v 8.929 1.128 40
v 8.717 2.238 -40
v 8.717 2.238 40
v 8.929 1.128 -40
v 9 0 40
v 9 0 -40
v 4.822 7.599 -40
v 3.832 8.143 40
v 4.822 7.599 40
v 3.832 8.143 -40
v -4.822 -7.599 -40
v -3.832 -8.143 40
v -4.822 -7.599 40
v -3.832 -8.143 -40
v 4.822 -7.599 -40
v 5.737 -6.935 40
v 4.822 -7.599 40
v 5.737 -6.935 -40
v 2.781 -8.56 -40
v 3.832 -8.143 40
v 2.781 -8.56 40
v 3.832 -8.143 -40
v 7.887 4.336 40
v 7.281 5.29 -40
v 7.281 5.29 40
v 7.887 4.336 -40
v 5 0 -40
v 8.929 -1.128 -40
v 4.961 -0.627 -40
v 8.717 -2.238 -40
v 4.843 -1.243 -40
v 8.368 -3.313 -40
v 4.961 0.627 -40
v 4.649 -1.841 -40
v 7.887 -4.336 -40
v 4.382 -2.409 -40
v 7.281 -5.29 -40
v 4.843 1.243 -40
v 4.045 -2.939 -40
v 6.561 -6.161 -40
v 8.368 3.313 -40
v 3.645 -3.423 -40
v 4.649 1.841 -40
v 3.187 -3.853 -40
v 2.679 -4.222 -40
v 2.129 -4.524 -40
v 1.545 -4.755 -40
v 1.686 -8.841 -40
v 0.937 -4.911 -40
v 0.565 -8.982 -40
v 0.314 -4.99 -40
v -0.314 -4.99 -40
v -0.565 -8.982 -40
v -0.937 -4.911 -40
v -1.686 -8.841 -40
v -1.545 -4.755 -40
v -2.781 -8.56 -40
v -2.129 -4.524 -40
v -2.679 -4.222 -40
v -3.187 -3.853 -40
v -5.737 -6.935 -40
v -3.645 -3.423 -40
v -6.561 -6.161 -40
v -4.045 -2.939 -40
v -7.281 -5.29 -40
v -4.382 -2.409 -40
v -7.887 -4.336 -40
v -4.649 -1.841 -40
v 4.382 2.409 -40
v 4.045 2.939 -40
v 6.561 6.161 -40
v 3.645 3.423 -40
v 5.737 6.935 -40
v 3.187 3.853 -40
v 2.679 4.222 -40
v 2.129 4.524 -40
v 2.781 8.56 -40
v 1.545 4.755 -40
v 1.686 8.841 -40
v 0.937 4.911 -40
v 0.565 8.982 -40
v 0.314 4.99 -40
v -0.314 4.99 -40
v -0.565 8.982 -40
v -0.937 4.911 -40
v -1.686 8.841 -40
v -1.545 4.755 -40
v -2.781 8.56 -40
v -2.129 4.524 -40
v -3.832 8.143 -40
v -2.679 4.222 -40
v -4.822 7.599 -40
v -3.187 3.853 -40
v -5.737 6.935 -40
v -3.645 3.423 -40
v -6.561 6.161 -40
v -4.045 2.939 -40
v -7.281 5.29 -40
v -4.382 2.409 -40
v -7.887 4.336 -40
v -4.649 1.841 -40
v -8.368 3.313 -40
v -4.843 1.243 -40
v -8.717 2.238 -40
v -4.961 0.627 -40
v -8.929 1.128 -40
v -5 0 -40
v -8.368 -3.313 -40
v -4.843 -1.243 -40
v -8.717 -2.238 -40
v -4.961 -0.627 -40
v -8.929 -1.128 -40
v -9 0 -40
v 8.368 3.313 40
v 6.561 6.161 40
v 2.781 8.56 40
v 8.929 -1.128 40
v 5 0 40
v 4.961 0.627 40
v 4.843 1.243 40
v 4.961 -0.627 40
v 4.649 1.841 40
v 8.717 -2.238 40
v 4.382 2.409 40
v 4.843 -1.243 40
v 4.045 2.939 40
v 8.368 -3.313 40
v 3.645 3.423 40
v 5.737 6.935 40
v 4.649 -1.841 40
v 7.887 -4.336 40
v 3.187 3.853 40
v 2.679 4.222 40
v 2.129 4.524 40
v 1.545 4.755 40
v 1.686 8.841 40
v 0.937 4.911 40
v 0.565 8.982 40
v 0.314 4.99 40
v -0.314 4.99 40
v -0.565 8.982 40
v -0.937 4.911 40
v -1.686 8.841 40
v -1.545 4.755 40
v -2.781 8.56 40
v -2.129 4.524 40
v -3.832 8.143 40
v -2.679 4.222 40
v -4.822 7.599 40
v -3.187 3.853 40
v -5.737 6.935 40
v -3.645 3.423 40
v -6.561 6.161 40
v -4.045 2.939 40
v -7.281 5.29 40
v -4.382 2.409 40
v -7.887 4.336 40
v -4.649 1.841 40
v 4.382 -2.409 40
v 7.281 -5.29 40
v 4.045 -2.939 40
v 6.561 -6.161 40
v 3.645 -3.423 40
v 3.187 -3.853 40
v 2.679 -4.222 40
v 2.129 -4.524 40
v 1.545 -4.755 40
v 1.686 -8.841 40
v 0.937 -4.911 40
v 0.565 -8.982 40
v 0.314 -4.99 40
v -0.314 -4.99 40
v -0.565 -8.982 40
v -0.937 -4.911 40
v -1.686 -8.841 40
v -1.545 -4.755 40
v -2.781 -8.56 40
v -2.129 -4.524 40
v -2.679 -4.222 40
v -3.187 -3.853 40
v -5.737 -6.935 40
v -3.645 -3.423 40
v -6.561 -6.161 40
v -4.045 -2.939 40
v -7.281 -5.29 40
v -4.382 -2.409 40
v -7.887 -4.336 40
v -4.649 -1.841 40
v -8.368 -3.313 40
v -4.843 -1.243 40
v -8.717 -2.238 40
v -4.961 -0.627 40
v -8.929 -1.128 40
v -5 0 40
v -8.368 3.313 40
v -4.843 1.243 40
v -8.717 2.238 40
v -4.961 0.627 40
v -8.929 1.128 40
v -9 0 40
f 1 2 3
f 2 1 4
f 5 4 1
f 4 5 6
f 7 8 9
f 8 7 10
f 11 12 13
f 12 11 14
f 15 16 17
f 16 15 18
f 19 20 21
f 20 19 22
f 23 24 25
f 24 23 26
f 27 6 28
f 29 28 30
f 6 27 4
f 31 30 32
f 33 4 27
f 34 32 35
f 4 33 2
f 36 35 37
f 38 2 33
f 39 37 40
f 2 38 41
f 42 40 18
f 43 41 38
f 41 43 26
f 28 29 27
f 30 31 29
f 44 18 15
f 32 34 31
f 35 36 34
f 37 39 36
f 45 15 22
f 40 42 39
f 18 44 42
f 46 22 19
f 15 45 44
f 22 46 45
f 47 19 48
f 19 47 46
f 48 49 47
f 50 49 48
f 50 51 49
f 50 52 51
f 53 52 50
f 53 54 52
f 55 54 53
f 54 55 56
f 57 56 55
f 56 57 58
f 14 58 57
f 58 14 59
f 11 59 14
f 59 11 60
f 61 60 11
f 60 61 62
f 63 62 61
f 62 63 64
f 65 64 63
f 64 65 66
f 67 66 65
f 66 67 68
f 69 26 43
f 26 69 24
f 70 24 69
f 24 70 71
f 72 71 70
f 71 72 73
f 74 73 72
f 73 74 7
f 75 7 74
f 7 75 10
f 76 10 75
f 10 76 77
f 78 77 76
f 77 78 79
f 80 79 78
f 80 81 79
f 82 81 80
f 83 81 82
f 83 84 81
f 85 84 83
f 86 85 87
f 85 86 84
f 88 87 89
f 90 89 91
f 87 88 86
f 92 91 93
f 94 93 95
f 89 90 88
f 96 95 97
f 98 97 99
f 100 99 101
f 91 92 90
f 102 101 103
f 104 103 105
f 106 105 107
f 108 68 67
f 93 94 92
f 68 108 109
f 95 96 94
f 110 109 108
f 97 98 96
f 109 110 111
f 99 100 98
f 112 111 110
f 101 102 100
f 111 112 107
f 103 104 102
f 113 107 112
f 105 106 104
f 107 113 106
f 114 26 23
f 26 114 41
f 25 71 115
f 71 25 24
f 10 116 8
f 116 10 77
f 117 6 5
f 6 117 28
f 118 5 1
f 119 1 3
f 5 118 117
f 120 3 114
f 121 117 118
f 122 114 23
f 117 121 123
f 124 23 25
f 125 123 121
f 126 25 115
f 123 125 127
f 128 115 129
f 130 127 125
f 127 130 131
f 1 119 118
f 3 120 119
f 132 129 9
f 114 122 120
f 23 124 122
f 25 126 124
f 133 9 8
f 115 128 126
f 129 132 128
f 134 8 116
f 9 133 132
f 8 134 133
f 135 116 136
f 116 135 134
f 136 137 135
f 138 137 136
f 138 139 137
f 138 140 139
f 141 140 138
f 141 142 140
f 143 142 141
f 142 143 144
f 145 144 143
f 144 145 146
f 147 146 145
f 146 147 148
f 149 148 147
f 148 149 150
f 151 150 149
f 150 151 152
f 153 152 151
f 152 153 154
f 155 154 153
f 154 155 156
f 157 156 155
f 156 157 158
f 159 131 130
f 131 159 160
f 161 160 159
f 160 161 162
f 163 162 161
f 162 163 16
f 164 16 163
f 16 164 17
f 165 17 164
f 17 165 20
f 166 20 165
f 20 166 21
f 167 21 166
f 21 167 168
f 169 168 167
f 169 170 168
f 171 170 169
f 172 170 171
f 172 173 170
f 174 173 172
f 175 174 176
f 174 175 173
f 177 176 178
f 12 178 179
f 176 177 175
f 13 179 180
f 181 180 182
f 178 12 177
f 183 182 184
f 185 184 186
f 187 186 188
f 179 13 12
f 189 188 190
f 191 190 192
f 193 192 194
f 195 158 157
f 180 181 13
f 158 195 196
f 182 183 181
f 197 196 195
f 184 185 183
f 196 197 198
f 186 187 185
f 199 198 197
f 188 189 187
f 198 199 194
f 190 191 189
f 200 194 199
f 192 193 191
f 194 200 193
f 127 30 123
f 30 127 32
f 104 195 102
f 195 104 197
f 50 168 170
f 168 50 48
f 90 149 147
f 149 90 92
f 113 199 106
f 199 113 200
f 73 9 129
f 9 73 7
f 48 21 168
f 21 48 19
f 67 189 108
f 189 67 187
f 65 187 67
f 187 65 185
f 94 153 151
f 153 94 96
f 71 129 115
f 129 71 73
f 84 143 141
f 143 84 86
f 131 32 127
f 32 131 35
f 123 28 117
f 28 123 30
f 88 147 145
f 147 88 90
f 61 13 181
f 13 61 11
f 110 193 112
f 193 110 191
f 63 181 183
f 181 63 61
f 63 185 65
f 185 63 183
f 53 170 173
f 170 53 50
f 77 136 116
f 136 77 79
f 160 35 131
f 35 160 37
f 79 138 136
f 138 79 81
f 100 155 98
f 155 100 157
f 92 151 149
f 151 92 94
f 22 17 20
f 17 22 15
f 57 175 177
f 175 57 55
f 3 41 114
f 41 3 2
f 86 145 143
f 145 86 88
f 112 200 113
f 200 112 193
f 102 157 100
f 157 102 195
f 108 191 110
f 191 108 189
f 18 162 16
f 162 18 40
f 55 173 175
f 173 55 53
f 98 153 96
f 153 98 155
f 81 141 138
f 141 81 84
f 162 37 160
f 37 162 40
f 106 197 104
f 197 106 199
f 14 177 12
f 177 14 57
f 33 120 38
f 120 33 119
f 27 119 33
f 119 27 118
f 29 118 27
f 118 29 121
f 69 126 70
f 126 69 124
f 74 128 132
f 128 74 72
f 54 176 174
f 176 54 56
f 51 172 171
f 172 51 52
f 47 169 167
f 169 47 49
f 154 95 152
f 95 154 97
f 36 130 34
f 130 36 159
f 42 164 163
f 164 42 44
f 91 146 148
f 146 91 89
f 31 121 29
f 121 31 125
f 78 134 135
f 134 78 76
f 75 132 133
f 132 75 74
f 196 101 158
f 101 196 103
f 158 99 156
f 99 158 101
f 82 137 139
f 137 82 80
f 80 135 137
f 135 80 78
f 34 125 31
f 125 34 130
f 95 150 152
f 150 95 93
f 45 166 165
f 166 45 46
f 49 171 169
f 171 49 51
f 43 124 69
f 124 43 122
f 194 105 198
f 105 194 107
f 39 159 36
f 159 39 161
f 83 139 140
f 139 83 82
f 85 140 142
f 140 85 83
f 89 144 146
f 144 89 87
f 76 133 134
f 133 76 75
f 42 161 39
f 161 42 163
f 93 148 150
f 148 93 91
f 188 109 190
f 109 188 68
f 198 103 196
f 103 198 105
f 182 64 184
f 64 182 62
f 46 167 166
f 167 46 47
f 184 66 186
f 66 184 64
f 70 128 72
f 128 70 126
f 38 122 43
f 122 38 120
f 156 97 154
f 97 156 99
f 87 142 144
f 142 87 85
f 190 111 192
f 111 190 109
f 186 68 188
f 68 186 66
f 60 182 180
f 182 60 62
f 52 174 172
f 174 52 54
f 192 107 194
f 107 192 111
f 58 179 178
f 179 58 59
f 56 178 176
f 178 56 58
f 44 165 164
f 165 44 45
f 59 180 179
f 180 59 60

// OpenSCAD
$fn = 50;


difference() {
	union() {
		translate(v = [0, 0, -40.0000000000]) {
			cylinder(h = 80, r = 9.0000000000);
		}
	}
	union() {
		translate(v = [0, 0, -100.0000000000]) {
			cylinder(h = 200, r = 5.0000000000);
		}
	}
}
